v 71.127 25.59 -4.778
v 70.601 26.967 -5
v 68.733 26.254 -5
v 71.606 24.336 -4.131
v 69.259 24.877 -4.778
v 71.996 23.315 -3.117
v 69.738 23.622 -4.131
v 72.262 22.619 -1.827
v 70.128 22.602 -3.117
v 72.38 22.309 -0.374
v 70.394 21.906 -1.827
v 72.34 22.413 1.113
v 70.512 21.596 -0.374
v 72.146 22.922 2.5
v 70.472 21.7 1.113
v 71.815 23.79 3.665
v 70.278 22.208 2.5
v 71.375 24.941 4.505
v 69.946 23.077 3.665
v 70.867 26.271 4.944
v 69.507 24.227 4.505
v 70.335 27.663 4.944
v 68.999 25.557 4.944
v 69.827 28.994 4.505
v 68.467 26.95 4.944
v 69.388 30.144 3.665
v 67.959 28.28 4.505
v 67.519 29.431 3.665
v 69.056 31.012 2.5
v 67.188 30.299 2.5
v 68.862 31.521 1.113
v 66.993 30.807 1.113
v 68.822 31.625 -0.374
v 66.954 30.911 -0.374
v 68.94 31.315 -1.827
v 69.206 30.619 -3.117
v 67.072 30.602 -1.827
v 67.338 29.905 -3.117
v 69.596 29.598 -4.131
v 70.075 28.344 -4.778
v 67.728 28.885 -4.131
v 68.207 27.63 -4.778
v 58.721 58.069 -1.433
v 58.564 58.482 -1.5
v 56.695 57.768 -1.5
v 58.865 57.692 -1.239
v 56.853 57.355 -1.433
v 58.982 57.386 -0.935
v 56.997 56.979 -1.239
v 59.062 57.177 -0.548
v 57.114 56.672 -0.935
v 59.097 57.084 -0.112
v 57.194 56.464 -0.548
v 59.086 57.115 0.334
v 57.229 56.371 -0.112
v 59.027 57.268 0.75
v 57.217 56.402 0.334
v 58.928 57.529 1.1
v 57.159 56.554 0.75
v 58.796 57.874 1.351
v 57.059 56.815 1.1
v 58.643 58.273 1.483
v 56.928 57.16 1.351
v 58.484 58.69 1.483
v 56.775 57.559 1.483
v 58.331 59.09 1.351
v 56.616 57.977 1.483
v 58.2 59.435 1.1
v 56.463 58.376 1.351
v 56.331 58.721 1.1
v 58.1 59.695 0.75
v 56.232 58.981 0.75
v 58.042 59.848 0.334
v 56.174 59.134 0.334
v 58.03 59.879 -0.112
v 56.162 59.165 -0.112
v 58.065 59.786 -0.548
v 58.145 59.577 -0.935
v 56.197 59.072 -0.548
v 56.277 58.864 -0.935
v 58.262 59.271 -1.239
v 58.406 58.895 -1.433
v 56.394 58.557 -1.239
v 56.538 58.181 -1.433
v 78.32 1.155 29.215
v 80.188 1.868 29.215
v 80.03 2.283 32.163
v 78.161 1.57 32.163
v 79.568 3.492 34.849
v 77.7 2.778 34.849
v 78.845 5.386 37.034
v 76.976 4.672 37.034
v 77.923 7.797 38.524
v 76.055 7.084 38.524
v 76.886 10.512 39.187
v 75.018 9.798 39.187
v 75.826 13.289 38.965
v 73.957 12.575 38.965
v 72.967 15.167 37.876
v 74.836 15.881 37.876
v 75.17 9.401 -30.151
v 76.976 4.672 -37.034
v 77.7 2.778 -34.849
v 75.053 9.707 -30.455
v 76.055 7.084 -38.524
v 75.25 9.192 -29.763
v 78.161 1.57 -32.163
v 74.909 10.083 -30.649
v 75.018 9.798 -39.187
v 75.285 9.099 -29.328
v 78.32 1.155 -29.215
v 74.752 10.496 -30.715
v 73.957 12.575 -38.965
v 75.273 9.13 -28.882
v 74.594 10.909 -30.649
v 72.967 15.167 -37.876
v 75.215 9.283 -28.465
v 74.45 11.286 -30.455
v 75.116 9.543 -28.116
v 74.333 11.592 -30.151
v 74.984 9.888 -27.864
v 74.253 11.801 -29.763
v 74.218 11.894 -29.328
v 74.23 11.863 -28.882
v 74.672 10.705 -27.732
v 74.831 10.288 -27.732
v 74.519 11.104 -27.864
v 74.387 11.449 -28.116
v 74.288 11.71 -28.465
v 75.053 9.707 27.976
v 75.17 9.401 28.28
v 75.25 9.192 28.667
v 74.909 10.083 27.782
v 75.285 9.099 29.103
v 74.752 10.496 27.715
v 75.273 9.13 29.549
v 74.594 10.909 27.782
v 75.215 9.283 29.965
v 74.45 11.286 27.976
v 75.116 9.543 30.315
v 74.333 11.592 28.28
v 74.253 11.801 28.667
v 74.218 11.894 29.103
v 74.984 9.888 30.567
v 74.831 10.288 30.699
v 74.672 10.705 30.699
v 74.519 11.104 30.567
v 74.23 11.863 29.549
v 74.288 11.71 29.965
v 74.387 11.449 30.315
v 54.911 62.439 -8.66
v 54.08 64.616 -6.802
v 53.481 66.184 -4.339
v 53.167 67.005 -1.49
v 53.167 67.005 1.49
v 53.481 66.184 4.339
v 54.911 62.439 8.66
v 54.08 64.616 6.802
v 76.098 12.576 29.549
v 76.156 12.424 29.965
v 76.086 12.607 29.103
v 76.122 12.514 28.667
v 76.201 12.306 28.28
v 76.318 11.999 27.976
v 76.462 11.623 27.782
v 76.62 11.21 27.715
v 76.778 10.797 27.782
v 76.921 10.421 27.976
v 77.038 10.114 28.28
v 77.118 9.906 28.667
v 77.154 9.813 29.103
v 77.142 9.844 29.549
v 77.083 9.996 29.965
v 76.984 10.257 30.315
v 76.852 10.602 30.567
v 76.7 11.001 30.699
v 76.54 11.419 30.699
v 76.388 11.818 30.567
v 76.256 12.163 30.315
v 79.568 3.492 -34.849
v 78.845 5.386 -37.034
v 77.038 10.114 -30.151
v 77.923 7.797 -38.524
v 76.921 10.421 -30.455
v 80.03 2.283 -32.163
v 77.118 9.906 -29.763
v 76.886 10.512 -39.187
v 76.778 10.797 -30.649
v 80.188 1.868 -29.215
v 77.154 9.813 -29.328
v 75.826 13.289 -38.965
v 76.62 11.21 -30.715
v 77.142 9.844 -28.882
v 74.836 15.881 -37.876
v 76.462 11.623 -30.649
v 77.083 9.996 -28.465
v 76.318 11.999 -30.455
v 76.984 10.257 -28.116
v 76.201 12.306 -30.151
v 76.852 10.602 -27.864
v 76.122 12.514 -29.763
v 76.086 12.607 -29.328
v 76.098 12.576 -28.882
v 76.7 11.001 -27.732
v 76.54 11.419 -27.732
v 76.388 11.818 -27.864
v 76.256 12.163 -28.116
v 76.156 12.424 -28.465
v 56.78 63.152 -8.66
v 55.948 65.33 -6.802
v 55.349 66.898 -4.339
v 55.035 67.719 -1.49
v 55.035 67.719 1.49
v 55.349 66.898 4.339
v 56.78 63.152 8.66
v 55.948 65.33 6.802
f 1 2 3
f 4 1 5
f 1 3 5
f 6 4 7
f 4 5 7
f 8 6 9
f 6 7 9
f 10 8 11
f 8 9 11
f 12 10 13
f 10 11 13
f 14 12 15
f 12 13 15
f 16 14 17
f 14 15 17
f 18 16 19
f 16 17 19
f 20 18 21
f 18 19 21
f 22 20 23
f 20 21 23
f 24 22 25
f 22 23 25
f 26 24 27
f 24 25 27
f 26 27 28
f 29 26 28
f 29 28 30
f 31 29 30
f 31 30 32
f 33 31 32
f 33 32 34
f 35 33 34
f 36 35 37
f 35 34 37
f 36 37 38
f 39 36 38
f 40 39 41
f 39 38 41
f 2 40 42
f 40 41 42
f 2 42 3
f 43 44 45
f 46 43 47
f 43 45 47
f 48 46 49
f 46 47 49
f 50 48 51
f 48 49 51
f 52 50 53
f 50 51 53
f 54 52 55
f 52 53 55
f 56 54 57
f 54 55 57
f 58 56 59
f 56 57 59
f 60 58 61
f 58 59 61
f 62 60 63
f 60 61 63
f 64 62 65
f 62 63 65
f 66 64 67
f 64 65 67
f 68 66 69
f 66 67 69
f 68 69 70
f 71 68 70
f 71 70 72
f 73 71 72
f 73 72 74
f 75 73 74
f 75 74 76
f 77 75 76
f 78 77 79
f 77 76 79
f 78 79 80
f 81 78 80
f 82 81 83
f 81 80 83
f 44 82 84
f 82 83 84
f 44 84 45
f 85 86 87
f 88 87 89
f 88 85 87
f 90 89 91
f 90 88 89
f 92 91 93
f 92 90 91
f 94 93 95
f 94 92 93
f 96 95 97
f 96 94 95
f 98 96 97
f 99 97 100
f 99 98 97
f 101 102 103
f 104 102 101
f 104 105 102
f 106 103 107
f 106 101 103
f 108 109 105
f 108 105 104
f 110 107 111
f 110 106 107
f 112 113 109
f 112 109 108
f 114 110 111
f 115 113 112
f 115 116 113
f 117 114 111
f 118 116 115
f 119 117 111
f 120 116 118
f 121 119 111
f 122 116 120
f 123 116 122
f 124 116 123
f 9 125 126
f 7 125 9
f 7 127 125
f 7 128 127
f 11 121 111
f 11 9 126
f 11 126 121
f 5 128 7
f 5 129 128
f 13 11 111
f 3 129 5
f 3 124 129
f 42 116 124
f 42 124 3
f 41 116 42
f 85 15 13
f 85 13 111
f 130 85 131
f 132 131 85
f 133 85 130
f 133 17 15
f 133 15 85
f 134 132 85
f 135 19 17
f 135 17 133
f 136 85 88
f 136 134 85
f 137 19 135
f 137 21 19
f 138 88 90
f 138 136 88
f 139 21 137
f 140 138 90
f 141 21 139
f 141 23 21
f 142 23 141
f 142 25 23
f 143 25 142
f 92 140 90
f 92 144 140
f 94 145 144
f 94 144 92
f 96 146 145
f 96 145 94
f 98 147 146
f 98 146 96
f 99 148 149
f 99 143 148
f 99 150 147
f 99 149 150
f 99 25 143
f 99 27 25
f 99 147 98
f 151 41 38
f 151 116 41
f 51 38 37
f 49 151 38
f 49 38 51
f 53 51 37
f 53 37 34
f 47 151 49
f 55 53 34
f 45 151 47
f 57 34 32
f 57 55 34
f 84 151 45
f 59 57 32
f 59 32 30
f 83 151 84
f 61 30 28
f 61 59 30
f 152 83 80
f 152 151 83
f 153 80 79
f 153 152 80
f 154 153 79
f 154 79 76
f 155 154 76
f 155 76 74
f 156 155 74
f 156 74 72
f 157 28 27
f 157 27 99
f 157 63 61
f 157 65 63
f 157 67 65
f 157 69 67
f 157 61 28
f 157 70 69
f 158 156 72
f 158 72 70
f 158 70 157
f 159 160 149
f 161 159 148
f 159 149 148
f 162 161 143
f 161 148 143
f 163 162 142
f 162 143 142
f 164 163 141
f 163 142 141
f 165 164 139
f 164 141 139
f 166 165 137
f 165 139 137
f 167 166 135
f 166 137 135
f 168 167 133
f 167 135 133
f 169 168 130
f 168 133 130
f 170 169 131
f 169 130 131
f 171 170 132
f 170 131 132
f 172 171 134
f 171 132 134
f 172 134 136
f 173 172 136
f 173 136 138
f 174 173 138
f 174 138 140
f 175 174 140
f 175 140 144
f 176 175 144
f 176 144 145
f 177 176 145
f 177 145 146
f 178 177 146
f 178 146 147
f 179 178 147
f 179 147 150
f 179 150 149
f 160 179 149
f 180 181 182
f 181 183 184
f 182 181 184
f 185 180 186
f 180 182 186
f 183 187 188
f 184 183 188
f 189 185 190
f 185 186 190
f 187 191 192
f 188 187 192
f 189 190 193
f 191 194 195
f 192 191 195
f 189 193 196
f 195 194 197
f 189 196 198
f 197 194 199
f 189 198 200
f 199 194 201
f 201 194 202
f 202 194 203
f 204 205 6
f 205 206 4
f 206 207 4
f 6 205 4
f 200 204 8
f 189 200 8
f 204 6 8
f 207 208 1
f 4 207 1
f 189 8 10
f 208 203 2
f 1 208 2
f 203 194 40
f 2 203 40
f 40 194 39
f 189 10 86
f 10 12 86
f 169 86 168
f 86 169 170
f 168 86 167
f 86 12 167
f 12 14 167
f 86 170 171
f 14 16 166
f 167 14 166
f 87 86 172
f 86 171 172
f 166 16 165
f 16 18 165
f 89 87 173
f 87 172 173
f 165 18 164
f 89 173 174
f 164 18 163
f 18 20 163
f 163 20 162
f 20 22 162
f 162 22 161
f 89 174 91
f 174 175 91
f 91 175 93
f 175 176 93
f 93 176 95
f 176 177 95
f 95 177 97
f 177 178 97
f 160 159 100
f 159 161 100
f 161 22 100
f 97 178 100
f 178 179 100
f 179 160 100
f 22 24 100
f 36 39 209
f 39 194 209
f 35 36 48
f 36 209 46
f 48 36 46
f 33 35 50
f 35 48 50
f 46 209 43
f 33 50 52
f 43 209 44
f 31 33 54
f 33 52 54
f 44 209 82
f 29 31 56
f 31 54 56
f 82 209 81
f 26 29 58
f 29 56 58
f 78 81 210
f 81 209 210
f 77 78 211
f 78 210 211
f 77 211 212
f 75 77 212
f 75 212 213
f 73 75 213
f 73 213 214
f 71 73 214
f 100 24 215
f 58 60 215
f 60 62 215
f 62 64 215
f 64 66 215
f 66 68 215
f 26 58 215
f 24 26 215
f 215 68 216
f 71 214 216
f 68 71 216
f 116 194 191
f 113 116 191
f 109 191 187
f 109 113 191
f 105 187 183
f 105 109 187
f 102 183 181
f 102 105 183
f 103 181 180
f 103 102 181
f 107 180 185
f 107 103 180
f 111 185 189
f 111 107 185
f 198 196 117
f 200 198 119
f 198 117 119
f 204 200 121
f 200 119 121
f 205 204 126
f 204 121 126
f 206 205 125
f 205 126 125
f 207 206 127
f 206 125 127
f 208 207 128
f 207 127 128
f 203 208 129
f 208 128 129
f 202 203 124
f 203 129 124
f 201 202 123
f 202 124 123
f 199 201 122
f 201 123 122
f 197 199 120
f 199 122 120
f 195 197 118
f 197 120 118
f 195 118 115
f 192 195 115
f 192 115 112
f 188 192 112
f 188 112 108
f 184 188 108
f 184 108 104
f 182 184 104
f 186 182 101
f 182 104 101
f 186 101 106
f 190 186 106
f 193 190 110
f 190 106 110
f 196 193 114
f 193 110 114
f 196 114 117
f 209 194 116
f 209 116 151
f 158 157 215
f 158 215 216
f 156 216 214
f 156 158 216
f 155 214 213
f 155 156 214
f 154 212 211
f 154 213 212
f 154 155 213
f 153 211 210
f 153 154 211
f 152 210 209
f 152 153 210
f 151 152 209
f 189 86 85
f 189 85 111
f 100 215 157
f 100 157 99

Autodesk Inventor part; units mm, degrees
ref_plane "YZ Plane" through (0, 0, 0) normal (1, 0, 0) x (0, 1, 0)
ref_plane "XZ Plane" through (0, 0, 0) normal (0, 1, 0) x (-1, 0, 0)
ref_plane "XY Plane" through (0, 0, 0) normal (0, 0, 1) x (1, 0, 0)
sketch "Sketch1" plane through (0, 0, 0) normal (0, 1, 0) x (-1, 0, 0)
  line L0 (-80.9017, 50) -> (80.9017, 50) construction
  line L1 (80.9017, 50) -> (80.9017, -50) construction
  line L2 (80.9017, -50) -> (-80.9017, -50) construction
  line L3 (-80.9017, -50) -> (-80.9017, 50) construction
  point P0 (0, 0)
  point P1 (0, 50)
  point P2 (80.9017, 0)
  dimension "d1" = 100
  dimension "d6" = 161.8034
sketch "Sketch2" plane through (0, 0, 0) normal (0, 0, 1) x (1, 0, 0)
  line L0 (-50, 80.9017) -> (50, 80.9017) construction
  line L1 (50, 80.9017) -> (50, -80.9017) construction
  line L2 (50, -80.9017) -> (-50, -80.9017) construction
  line L3 (-50, -80.9017) -> (-50, 80.9017) construction
  point P0 (0, 0)
  point P1 (0, 80.9017)
  point P2 (50, 0)
  dimension "d3" = 161.8034
  dimension "d7" = 100
sketch "Sketch3" plane through (0, 0, 0) normal (1, 0, 0) x (0, 1, 0)
  line L0 (-50, 80.9017) -> (50, 80.9017) construction
  line L1 (50, 80.9017) -> (50, -80.9017) construction
  line L2 (50, -80.9017) -> (-50, -80.9017) construction
  line L3 (-50, -80.9017) -> (-50, 80.9017) construction
  point P0 (0, 0)
  point P1 (50, 0)
  point P2 (0, 80.9017)
  dimension "d4" = 161.8034
  dimension "d5" = 100
sketch "Sketch7" plane through (0, 0, 0) normal (1, 0, 0) x (0, 1, 0)
  circle A0 centre (0, 0) radius 200 construction
  dimension "BallDiameter" = 400
ref_plane "Work Plane2" through (80.9017, 0, -50) normal (-0.9341724, -0.3568221, 0) x (0, 0, 1)
sketch "Sketch8" plane through (80.9017, 0, -50) normal (-0.9341724, -0.3568221, 0) x (0, 0, 1)
  line L0 (50, 86.6025) -> (0, 0) construction
  line L1 (0, 0) -> (100, 0) construction
  line L2 (100, 0) -> (50, 86.6025) construction
  line L3 (3.4641, 2) -> (50, 82.6025)
  line L4 (50, 82.6025) -> (96.5359, 2)
  line L5 (96.5359, 2) -> (3.4641, 2)
  point P0 (50, 28.8675)
  dimension "d21" = 2
  dimension "d22" = 2
  dimension "d23" = 2
extrude "Extrusion3" add sketch "Sketch8" along normal blind 2
fillet "Fillet1" radius 10 3 edges at (79.2539, 1.5115, -46.5359) (79.2539, 1.5115, 46.5359) (50.4931, 76.8082, 0)
sketch "Sketch11" plane through (80.9017, 0, -50) normal (0.9341724, 0.3568221, 0) x (0, 0, -1)
  circle A0 centre (-50, 28.8675) radius 5
  dimension "d34" = 10
hole "Hole2" at (70.6011, 26.9672, 0) direction (-0.9341724, -0.3568221, 0) diameter 10 end through all
sketch "Sketch10" plane through (80.9017, 0, -50) normal (0.9341724, 0.3568221, 0) x (0, 0, -1)
  arc A0 (-41.3397, 67.6025) -> (-58.6603, 67.6025) centre (-50, 62.6025) ccw projected
  circle A1 centre (-50, 62.6025) radius 1.5
  point P0 (-50, 28.8675)
  dimension "d25" = 3
hole "Hole1" at (58.5637, 58.4816, 0) direction (-0.9341724, -0.3568221, 0) diameter 3 end through all
pattern_circular "Circular Pattern1" count 3 over 360 about axis through (-28.8274, -11.0111, 0) along (0.9341724, 0.3568221, 0) of "Hole1"
equation "\"d1\" = IcoLen"
equation "\"d6\" = IcoWidth"
equation "\"d3\" = IcoWidth"
equation "\"d7\" = IcoLen"
equation "\"d4\" = IcoWidth"
equation "\"d5\" = IcoLen"
equation "\"BallDiameter\" = 2 * BallRadius"
equation "\"IcoLen\" = 100"
equation "\"IcoWidth\" = 1.61803 * IcoLen"
equation "\"BallRadius\" = 200"
properties part number "Frame"
